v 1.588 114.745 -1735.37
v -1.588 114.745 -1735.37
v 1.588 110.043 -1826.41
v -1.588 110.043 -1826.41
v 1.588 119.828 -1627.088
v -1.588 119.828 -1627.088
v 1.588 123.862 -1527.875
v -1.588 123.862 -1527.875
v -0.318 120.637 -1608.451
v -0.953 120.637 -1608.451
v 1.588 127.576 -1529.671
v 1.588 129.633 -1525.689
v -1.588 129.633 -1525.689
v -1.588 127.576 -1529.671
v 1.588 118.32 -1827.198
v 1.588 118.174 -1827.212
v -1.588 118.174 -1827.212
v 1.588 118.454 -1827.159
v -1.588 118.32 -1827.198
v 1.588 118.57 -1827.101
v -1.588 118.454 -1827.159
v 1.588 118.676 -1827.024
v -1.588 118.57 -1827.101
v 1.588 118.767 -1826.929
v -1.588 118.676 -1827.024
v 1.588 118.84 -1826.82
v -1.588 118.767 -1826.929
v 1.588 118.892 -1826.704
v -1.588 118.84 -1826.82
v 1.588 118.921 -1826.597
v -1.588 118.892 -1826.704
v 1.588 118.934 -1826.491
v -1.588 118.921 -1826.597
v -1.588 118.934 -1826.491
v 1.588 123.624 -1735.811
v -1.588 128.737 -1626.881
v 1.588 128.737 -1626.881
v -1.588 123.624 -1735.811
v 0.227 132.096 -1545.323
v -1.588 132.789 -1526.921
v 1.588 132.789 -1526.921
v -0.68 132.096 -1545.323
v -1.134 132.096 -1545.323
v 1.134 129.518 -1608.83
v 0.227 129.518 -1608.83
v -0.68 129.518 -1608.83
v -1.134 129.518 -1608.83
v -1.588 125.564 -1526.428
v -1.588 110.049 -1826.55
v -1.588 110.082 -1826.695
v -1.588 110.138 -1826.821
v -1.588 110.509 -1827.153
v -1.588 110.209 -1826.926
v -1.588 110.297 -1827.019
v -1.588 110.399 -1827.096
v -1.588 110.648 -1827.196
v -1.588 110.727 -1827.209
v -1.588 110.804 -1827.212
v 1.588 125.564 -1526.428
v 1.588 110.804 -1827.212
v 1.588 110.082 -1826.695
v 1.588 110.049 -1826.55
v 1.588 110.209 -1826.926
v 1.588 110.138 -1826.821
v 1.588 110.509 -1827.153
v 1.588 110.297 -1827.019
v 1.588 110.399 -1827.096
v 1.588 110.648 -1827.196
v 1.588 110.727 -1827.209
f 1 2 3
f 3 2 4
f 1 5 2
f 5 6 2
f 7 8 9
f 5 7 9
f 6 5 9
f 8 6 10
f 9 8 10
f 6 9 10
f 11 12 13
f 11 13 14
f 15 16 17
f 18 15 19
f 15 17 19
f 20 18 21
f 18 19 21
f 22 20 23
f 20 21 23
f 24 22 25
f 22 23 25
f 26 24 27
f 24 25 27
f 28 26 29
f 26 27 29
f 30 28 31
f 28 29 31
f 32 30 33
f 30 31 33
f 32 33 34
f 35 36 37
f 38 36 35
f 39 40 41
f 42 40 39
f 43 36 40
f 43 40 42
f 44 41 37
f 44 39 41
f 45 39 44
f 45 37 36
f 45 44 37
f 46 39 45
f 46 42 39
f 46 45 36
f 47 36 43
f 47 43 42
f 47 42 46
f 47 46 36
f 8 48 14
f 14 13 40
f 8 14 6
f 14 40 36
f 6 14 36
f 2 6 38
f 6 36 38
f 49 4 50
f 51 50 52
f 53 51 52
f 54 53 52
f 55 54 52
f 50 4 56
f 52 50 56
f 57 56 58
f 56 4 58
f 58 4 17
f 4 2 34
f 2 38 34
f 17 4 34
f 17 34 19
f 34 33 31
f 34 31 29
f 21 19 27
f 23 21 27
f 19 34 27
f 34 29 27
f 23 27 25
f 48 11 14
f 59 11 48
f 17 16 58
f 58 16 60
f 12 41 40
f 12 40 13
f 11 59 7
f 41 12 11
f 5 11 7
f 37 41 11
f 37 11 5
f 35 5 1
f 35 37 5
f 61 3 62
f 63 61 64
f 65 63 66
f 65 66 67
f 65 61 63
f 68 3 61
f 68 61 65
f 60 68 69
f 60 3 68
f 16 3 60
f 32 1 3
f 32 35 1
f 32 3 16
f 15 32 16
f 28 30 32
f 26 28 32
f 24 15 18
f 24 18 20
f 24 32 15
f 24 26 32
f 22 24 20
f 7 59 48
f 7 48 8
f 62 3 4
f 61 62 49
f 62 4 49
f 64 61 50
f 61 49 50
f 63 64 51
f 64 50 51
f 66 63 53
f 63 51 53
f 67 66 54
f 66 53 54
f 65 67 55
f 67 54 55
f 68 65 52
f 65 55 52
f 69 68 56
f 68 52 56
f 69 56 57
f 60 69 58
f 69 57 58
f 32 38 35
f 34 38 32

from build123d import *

# Parameters (mm, degrees)
BOSS_EXTRUDE1_START = -1.5875
BOSS_EXTRUDE1_DEPTH = 3.175
FILLET1_R           = 2.54
CUT_EXTRUDE1_DEPTH  = 2674.191025632
FILLET2_R           = 0.762
FILLET3_R           = 0.762
SKETCH5_W           = 636.742492472
SKETCH5_H           = 356.774003564
CUT_EXTRUDE2_DEPTH  = 7.62


with BuildPart() as part:
    # Boss-Extrude1: read off the stored shape, not the designer's step
    # Boss-Extrude1 outline → Boss-Extrude1 (new body)
    with BuildSketch(Plane(origin=(0, 0, 0), x_dir=(0, 0, -1), z_dir=(1, 0, 0)).offset(BOSS_EXTRUDE1_START)):
        with BuildLine():
            add(Edge.make_bspline(
                [(1110.404970926, 130.384545774), (1120.170834465, 130.370061323), (1139.703057908, 130.338772026), (1168.998370974, 130.277673039), (1198.290610395, 130.194386876), (1217.81419633, 130.113940836), (1227.576506903, 130.06508052)],
                knots=[0, 0, 0, 0, 0.25, 0.5, 0.75, 1, 1, 1, 1], degree=3))
            add(Edge.make_bspline(
                [(1227.576506903, 130.06508052), (1269.911205773, 129.853195249), (1333.427746701, 129.273373321), (1418.042208161, 127.449050563), (1502.665994832, 124.913583682), (1608.454176987, 120.803299479), (1693.070073331, 116.848243245), (1735.369787733, 114.744712179)],
                knots=[0, 0, 0, 0, 0.25, 0.375, 0.5, 0.75, 1, 1, 1, 1], degree=3))
            add(Edge.make_bspline(
                [(1735.369787733, 114.744712179), (1815.995940723, 110.735232018), (1936.906650462, 104.096364548), (2098.049485168, 94.18797875), (2198.694736725, 87.314638509), (2279.130413747, 81.114418931), (2339.412950304, 76.034076608), (2399.564054334, 70.28270545), (2479.570468264, 61.127378254), (2559.292087872, 49.650907614), (2626.797554585, 38.235484735), (2656.889518578, 32.788503969), (2667.159793662, 30.877771266), (2669.54, 30.432069924)],
                knots=[0, 0, 0, 0, 0.25, 0.375, 0.5, 0.5625, 0.625, 0.6875, 0.75, 0.875, 0.9375, 0.96241067, 0.969928536, 0.969928536, 0.969928536, 0.969928536], degree=3))
            Line((2669.54, 30.432069924), (2669.54, 39.476142465))
            add(Edge.make_bspline(
                [(1735.811334709, 123.623740069), (1776.138635499, 121.618292624), (1816.460281579, 119.500621806), (1897.093668675, 115.087561885), (1937.405638896, 112.792971084), (2018.018419045, 108.018366523), (2058.319512223, 105.539122976), (2138.903780144, 100.307240032), (2179.18739793, 97.555127955), (2239.586998714, 93.080168687), (2259.716280977, 91.529837622), (2289.900442602, 89.09084343), (2299.960179135, 88.258845039), (2320.076004566, 86.552861654), (2330.132100898, 85.678962223), (2350.239356518, 83.874334847), (2360.290489794, 82.943307484), (2380.385973971, 81.003183297), (2390.430065378, 79.993418555), (2420.547026195, 76.827577532), (2440.60648589, 74.533672955), (2480.675569568, 69.556278523), (2500.68715183, 66.874150811), (2540.654290207, 61.150246295), (2560.611026428, 58.109755646), (2600.475457131, 51.702465574), (2620.382967089, 48.337538888), (2650.028116889, 43.072156367), (2659.78844051, 41.29687683), (2669.54, 39.476142465)],
                knots=[0, 0, 0, 0, 0.125, 0.125, 0.25, 0.25, 0.375, 0.375, 0.5, 0.5, 0.5625, 0.5625, 0.59375, 0.59375, 0.625, 0.625, 0.65625, 0.65625, 0.6875, 0.6875, 0.75, 0.75, 0.8125, 0.8125, 0.875, 0.875, 0.9375, 0.9375, 0.968210768, 0.968210768, 0.968210768, 0.968210768], degree=3))
            add(Edge.make_bspline(
                [(1227.621000751, 138.954969175), (1248.807303679, 138.848931677), (1269.993583155, 138.701170252), (1312.363832348, 138.270664618), (1333.547719008, 137.987407832), (1375.912368189, 137.249274813), (1397.09309738, 136.7925677), (1439.451328259, 135.701855835), (1460.629010312, 135.069210584), (1502.979101161, 133.670541385), (1524.152152736, 132.907434339), (1566.494303759, 131.284732459), (1587.663166024, 130.423163385), (1651.164052809, 127.709123983), (1693.490421561, 125.728325331), (1735.811334709, 123.623740069)],
                knots=[0, 0, 0, 0, 0.125, 0.125, 0.25, 0.25, 0.375, 0.375, 0.5, 0.5, 0.625, 0.625, 0.75, 0.75, 1, 1, 1, 1], degree=3))
            add(Edge.make_bspline(
                [(1110.418156307, 139.274535996), (1129.952027249, 139.245563914), (1149.485893504, 139.211997476), (1188.553558893, 139.115899087), (1208.087346834, 139.052735015), (1227.621000751, 138.954969175)],
                knots=[0, 0, 0, 0, 0.5, 0.5, 1, 1, 1, 1], degree=3))
            add(Edge.make_bspline(
                [(768.740124165, 138.468408213), (782.976796045, 138.460280143), (797.213453801, 138.479500079), (825.686695051, 138.549690296), (839.923258916, 138.600062665), (868.396318956, 138.719026333), (882.632808962, 138.789607972), (911.105746117, 138.939594729), (925.342197007, 139.018479563), (953.81517223, 139.160090703), (968.051699178, 139.222241505), (996.524919377, 139.30995407), (1010.761605517, 139.335014039), (1039.234912871, 139.349647552), (1053.471562869, 139.340493535), (1081.944860968, 139.313691902), (1096.181508981, 139.29565137), (1110.418156307, 139.274535996)],
                knots=[0, 0, 0, 0, 0.125, 0.125, 0.25, 0.25, 0.375, 0.375, 0.5, 0.5, 0.625, 0.625, 0.75, 0.75, 0.875, 0.875, 1, 1, 1, 1], degree=3))
            add(Edge.make_bspline(
                [(630.778432202, 139.251437536), (653.771819614, 139.075315664), (676.765000849, 138.871740519), (711.255349111, 138.647690701), (722.752238945, 138.586174182), (745.746099074, 138.499784896), (757.243084259, 138.474972158), (768.740124165, 138.468408213)],
                knots=[0, 0, 0, 0, 0.5, 0.5, 0.75, 0.75, 1, 1, 1, 1], degree=3))
            add(Edge.make_bspline(
                [(604.514984259, 139.433685568), (609.940743136, 139.400696354), (618.695242427, 139.342071397), (627.449694696, 139.276935028), (630.778432202, 139.251437536)],
                knots=[0, 0, 0, 0, 0.619765686, 1, 1, 1, 1], degree=3))
            ThreePointArc((604.514984259, 139.433685568), (600.549356142, 139.457173081), (596.583720644, 139.479379304))
            add(Edge.make_bspline(
                [(436.133018826, 139.357176562), (449.50393779, 139.390650739), (462.874888934, 139.412366015), (489.61665939, 139.498555977), (502.987497127, 139.559076553), (529.729299233, 139.628029754), (543.100240501, 139.639230481), (569.84212102, 139.601013959), (583.212960696, 139.552035302), (596.583720644, 139.479379304)],
                knots=[0, 0, 0, 0, 0.25, 0.25, 0.5, 0.5, 0.75, 0.75, 1, 1, 1, 1], degree=3))
            add(Edge.make_bspline(
                [(432.263917423, 139.347117104), (433.553617637, 139.350567112), (434.843318039, 139.353947814), (436.133018826, 139.357176562)],
                knots=[0, 0, 0, 0, 1, 1, 1, 1], degree=3))
            add(Edge.make_bspline(
                [(420.316232014, 139.305761868), (422.413235913, 139.315186344), (426.395793967, 139.330351666), (430.378363115, 139.342073082), (432.263917423, 139.347117104)],
                knots=[0, 0, 0, 0, 0.526548575, 1, 1, 1, 1], degree=3))
            add(Edge.make_bspline(
                [(376.410119779, 138.75403864), (383.726317086, 138.935561778), (391.043801196, 139.055611797), (405.679602634, 139.224192856), (412.997895507, 139.272871444), (420.316232014, 139.305761868)],
                knots=[0, 0, 0, 0, 0.5, 0.5, 1, 1, 1, 1], degree=3))
            add(Edge.make_bspline(
                [(336.49221538, 137.002990798), (349.782924989, 137.88646357), (363.094318653, 138.423658969), (376.410119779, 138.75403864)],
                knots=[0, 0, 0, 0, 1, 1, 1, 1], degree=3))
            add(Edge.make_bspline(
                [(322.369488076, 135.928469458), (327.073374868, 136.333386449), (331.781331813, 136.689844531), (336.49221538, 137.002990798)],
                knots=[0, 0, 0, 0, 1, 1, 1, 1], degree=3))
            add(Edge.make_bspline(
                [(269.769949315, 129.47895505), (274.123387467, 130.231879276), (278.485668028, 130.925946417), (287.22796256, 132.196043087), (291.608626646, 132.771988738), (300.381777496, 133.818422146), (304.774579419, 134.288963443), (313.567800313, 135.154375086), (317.967903853, 135.549407043), (322.369488076, 135.928469458)],
                knots=[0, 0, 0, 0, 0.25, 0.25, 0.5, 0.5, 0.75, 0.75, 1, 1, 1, 1], degree=3))
            add(Edge.make_bspline(
                [(135.15718457, 90.054634926), (146.043739673, 94.375230064), (156.99891695, 98.504335222), (173.56622243, 104.322560697), (179.110932848, 106.199810145), (190.24859245, 109.819698901), (195.841545849, 111.562316625), (207.065472514, 114.901345648), (212.697969124, 116.49836249), (224.005973618, 119.540534541), (229.683240596, 120.9862349), (246.767187276, 125.077694043), (258.225188059, 127.482295924), (269.769949315, 129.47895505)],
                knots=[0, 0, 0, 0, 0.25, 0.25, 0.375, 0.375, 0.5, 0.5, 0.625, 0.625, 0.75, 0.75, 1, 1, 1, 1], degree=3))
            add(Edge.make_bspline(
                [(107.049744533, 78.466050261), (116.373258882, 82.438606419), (125.737350123, 86.316143859), (135.15718457, 90.054634926)],
                knots=[0, 0, 0, 0, 1, 1, 1, 1], degree=3))
            add(Edge.make_bspline(
                [(99.06, 75.03568963), (99.223542669, 75.106424562), (100.635498802, 75.716852689), (103.297453866, 76.863328103), (105.798503999, 77.932922637), (107.049744533, 78.466050261)],
                knots=[0.484151133, 0.484151133, 0.484151133, 0.484151133, 0.515864471, 0.757931449, 1, 1, 1, 1], degree=3))
            Line((99.06, 75.03568963), (99.06, 65.345043949))
            add(Edge.make_bspline(
                [(99.06, 65.345043949), (99.380370965, 65.484464523), (100.637671455, 66.031176319), (103.17753745, 67.132002814), (106.681577323, 68.64166857), (109.249580285, 69.740028797), (110.534459652, 70.287489229)],
                knots=[0.254738807, 0.254738807, 0.254738807, 0.254738807, 0.317238807, 0.5, 0.75, 1, 1, 1, 1], degree=3))
            add(Edge.make_bspline(
                [(110.534459652, 70.287489229), (112.850658013, 71.274373329), (117.489277519, 73.236837099), (124.456688526, 76.138068453), (131.438476528, 78.994265342), (136.101204469, 80.864754132), (138.436571012, 81.791601309)],
                knots=[0, 0, 0, 0, 0.25, 0.5, 0.75, 1, 1, 1, 1], degree=3))
            add(Edge.make_bspline(
                [(138.436571012, 81.791601309), (143.826897197, 83.930883835), (154.6522834, 88.11877139), (176.408203186, 96.037596764), (203.906835742, 104.998187521), (237.39469787, 114.027149543), (259.934818065, 118.755998441), (271.284977744, 120.719001348)],
                knots=[0, 0, 0, 0, 0.125, 0.25, 0.5, 0.75, 1, 1, 1, 1], degree=3))
            add(Edge.make_bspline(
                [(271.284977744, 120.719001348), (275.558711595, 121.458140765), (284.124297478, 122.821139095), (297.036360548, 124.518896272), (310.018420247, 125.909880891), (318.766623126, 126.695286194), (323.13209925, 127.071239405)],
                knots=[5e-09, 5e-09, 5e-09, 5e-09, 0.2499992, 0.4999984, 0.7499976, 0.999996801, 0.999996801, 0.999996801, 0.999996801], degree=3))
            add(Edge.make_bspline(
                [(323.13209925, 127.071239405), (324.293050056, 127.171175344), (326.615168427, 127.365043892), (330.101568176, 127.638529754), (333.590184216, 127.895089457), (335.917953069, 128.055198639), (337.081858513, 128.132566852)],
                knots=[1.2024e-05, 1.2024e-05, 1.2024e-05, 1.2024e-05, 0.250009018, 0.500006012, 0.750003006, 1, 1, 1, 1], degree=3))
            add(Edge.make_bspline(
                [(337.081858513, 128.132566852), (340.367862287, 128.350997241), (346.939906877, 128.744909116), (356.821319657, 129.221190111), (366.716250393, 129.595096292), (373.326613137, 129.784797569), (376.630622597, 129.866773678)],
                knots=[0, 0, 0, 0, 0.25, 0.5, 0.75, 1, 1, 1, 1], degree=3))
            add(Edge.make_bspline(
                [(376.630622597, 129.866773678), (380.266394474, 129.956981294), (387.534764147, 130.106779908), (398.462206547, 130.259361028), (409.400972015, 130.358727994), (416.705417778, 130.39944419), (420.356185481, 130.415851648)],
                knots=[0, 0, 0, 0, 0.25, 0.5, 0.75, 1, 1, 1, 1], degree=3))
            add(Edge.make_bspline(
                [(420.356185481, 130.415851648), (421.350045129, 130.420318309), (423.337533562, 130.428603137), (426.320174328, 130.439402209), (429.303468332, 130.448883952), (431.293011648, 130.454488038), (432.287698861, 130.457148912)],
                knots=[0, 0, 0, 0, 0.25, 0.5, 0.75, 1, 1, 1, 1], degree=3))
            add(Edge.make_bspline(
                [(432.287698861, 130.457148912), (432.610032304, 130.45801117), (433.254717136, 130.45972707), (434.221637716, 130.462266911), (435.188505114, 130.464765142), (435.833012253, 130.466397641), (436.155274747, 130.46720442)],
                knots=[9.2e-08, 9.2e-08, 9.2e-08, 9.2e-08, 0.25, 0.5, 0.75, 1, 1, 1, 1], degree=3))
            add(Edge.make_bspline(
                [(436.155274747, 130.46720442), (449.528322363, 130.500683927), (476.275740382, 130.546633815), (516.38896029, 130.728798697), (556.456290895, 130.759667498), (583.176533448, 130.662101975), (596.535396133, 130.589510646)],
                knots=[0, 0, 0, 0, 0.249999973, 0.499999946, 0.749999918, 0.999999891, 0.999999891, 0.999999891, 0.999999891], degree=3))
            ThreePointArc((596.535396133, 130.589510646), (600.498158983, 130.567320504), (604.460914457, 130.543849998))
            add(Edge.make_bspline(
                [(604.460914457, 130.543849998), (606.648150431, 130.530551362), (611.022503017, 130.502867011), (617.584689429, 130.458405465), (624.147187284, 130.411339888), (628.522663802, 130.378455494), (630.7103385, 130.361698324)],
                knots=[-7.09e-07, -7.09e-07, -7.09e-07, -7.09e-07, 0.249999468, 0.499999646, 0.749999823, 1, 1, 1, 1], degree=3))
            add(Edge.make_bspline(
                [(630.7103385, 130.361698324), (642.206126489, 130.273644326), (665.193556095, 130.083785311), (699.699077953, 129.819212193), (734.21504011, 129.634735151), (757.228597075, 129.58497898), (768.735048644, 129.578409662)],
                knots=[0, 0, 0, 0, 0.25, 0.5, 0.75, 1, 1, 1, 1], degree=3))
            add(Edge.make_bspline(
                [(768.735048644, 129.578409662), (797.222409768, 129.56214552), (854.203652026, 129.725124503), (939.635195481, 130.236578518), (1024.992958464, 130.524931921), (1081.937612336, 130.426767717), (1110.404970926, 130.384545774)],
                knots=[0, 0, 0, 0, 0.25, 0.5, 0.75, 1, 1, 1, 1], degree=3))
        make_face()
    extrude(amount=BOSS_EXTRUDE1_DEPTH)

    # Fillet1
    fillet1_edges = [part.edges().sort_by_distance(p)[0] for p in [
        (0, 39.476142465, -2669.54),
        (0, 30.432069924, -2669.54),
        (0, 65.345043949, -99.06),
        (0, 75.03568963, -99.06),
    ]]
    fillet(fillet1_edges, radius=FILLET1_R)

    # Sketch4 → Cut-Extrude1 (cut, through all)
    with BuildSketch(Plane(origin=(1.5875, 0, 0), x_dir=(0, 0, -1), z_dir=(1, 0, 0))):
        Polygon((1827.2125, 118.895836595), (1827.2125, 110.000384115), (1827.2125, 78.791710134), (2135.1875, 78.791710134), (2135.1875, 91.599357392), (2135.1875, 100.508307819), (2135.1875, 129.353842083), (1827.2125, 129.353842083), align=None)
    extrude(amount=-CUT_EXTRUDE1_DEPTH, mode=Mode.SUBTRACT)


with BuildPart() as cut_extrude1_piece_1:
    # of the separate pieces the step leaves, piece 1, a body of its own (cut_extrude1_pieces)
    add(part.part.solids().sort_by_distance((-1.5875, 114.744712179, -1735.369787733))[0])

    # Fillet2
    fillet2_edges = [cut_extrude1_piece_1.edges().sort_by_distance(p)[0] for p in [
        (0, 118.895836595, -1827.2125),
        (0, 110.000384116, -1827.2125),
    ]]
    fillet(fillet2_edges, radius=FILLET2_R)


with BuildPart() as cut_extrude1_piece_2:
    # of the separate pieces the step leaves, piece 2, a body of its own (cut_extrude1_pieces)
    add(part.part.solids().sort_by_distance((-1.5875, 91.599357392, -2135.1875))[0])

    # Fillet3
    fillet3_edges = [cut_extrude1_piece_2.edges().sort_by_distance(p)[0] for p in [
        (0, 100.508307819, -2135.1875),
        (0, 91.599357392, -2135.1875),
    ]]
    fillet(fillet3_edges, radius=FILLET3_R)


with BuildPart() as cut_extrude2_tool:
    # Sketch5 → Cut-Extrude2 (new body)
    with BuildSketch(Plane(origin=(1.5875, 0, 0), x_dir=(0, 0, -1), z_dir=(1, 0, 0))):
        Polygon((1526.921002642, 132.788776067), (1525.689431031, 129.632745348), (1529.671392187, 127.575945218), (1526.428351657, 125.564439067), (1528.398437884, 123.245298517), (1528.398437884, 118.623114405), (-69.434984225, -369.526535585), (-528.734858547, 275.104866971), (1526.921002642, 184.452057857), align=None)
        with Locations((2399.198239347, 52.922681549)):
            Rectangle(SKETCH5_W, SKETCH5_H)
    extrude(amount=-CUT_EXTRUDE2_DEPTH)


with BuildPart() as cut_extrude1_piece_1_1:
    add(cut_extrude1_piece_1.part)

    # Cut-Extrude2: cut by cut_extrude2_tool
    add(cut_extrude2_tool.part, mode=Mode.SUBTRACT)


with BuildPart() as cut_extrude1_piece_2_1:
    add(cut_extrude1_piece_2.part)

    # Cut-Extrude2: cut by cut_extrude2_tool
    add(cut_extrude2_tool.part, mode=Mode.SUBTRACT)


solid = cut_extrude1_piece_1_1.part
